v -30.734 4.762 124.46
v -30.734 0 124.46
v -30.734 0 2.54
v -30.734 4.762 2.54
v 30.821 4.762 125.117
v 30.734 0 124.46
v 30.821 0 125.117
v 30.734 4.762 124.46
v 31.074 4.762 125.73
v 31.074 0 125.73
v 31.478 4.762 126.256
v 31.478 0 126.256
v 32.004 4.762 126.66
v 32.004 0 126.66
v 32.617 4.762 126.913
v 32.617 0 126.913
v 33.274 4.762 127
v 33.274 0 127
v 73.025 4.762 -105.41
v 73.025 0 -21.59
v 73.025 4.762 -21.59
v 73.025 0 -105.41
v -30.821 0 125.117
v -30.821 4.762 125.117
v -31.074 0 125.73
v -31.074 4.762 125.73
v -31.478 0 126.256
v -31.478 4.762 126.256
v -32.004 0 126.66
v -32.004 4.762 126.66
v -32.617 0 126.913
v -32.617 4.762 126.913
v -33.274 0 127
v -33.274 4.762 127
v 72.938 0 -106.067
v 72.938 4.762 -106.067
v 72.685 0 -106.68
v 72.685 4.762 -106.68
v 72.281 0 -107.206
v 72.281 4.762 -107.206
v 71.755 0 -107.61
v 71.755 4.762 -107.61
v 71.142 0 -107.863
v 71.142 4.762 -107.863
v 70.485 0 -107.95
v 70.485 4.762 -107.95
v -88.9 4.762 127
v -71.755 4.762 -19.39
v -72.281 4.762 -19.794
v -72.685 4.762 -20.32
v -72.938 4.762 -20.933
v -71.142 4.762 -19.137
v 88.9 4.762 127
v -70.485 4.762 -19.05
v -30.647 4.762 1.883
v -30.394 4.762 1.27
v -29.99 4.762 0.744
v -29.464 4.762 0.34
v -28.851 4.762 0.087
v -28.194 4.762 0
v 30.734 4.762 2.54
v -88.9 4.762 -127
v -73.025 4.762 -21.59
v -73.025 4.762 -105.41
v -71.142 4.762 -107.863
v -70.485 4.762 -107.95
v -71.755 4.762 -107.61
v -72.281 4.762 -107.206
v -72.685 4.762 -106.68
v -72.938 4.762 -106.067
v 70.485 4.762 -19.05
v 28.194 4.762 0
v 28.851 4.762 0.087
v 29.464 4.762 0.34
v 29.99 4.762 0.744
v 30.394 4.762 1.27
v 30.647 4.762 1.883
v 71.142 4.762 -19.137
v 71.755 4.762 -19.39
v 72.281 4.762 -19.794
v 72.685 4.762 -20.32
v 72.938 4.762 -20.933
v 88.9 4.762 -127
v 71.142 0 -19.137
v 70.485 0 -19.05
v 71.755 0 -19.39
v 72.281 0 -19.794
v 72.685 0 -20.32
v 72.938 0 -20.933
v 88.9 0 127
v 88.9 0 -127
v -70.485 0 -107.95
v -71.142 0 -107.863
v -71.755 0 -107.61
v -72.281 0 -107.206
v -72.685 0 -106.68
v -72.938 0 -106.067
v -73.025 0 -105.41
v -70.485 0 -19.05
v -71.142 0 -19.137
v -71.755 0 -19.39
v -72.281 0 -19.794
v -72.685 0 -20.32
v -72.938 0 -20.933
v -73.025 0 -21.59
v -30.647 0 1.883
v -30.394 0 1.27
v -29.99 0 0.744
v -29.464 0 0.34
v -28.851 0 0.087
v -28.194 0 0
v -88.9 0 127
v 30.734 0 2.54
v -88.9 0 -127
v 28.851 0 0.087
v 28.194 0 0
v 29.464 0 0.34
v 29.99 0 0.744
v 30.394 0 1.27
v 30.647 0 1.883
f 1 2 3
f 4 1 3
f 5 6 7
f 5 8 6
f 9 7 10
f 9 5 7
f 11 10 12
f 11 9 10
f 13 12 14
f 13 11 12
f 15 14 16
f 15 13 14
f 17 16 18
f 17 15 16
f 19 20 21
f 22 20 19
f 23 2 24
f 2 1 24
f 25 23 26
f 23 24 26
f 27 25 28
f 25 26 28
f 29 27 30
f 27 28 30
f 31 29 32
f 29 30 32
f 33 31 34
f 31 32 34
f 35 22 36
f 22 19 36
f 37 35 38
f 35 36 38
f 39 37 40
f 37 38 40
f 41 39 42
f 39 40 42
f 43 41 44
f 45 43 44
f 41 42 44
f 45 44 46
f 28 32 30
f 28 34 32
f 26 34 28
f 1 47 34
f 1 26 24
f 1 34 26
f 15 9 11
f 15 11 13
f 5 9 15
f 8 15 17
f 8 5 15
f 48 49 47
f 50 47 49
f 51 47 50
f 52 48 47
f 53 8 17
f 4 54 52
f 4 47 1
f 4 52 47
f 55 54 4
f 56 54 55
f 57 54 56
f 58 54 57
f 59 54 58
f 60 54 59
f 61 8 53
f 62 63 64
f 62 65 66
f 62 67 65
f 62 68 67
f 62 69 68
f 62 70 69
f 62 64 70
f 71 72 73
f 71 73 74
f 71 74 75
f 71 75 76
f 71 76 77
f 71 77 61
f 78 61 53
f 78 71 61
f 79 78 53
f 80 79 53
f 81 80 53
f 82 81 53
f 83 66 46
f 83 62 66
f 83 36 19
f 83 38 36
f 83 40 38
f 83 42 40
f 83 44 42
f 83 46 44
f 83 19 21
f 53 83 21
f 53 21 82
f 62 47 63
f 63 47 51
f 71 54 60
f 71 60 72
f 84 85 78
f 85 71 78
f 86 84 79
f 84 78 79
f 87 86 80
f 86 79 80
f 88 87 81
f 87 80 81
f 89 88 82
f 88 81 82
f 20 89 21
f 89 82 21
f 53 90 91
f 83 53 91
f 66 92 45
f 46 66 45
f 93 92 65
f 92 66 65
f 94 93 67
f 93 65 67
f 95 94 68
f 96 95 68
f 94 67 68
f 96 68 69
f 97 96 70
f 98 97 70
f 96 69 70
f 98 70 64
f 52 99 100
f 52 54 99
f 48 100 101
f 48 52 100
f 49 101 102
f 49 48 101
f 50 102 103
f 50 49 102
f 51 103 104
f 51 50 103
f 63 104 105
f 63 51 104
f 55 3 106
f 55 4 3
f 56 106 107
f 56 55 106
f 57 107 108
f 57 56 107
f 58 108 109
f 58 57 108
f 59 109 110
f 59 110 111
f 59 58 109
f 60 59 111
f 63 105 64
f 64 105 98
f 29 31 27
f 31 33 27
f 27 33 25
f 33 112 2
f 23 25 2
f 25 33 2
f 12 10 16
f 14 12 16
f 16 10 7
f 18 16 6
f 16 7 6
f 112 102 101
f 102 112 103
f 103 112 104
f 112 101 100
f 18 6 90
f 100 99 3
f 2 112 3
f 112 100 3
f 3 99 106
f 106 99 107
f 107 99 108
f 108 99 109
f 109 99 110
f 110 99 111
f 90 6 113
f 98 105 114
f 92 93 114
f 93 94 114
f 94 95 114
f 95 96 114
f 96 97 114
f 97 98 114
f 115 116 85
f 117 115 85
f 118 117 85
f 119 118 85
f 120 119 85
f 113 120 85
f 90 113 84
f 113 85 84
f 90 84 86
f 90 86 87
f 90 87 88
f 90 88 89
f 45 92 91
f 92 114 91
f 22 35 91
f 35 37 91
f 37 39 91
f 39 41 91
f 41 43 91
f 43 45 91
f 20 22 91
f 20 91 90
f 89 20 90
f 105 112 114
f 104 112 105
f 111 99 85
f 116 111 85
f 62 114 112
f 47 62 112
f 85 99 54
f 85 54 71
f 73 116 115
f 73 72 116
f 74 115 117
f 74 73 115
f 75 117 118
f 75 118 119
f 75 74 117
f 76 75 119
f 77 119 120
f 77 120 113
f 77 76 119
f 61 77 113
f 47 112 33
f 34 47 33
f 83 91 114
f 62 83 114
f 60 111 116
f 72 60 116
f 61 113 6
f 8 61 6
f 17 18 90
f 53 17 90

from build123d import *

# Parameters (mm, degrees)
SKETCH1_W           = 146.05
SKETCH1_H           = 88.9
BOSS_EXTRUDE1_DEPTH = 4.7625
FILLET1_R           = 2.54


with BuildPart() as part:
    # Sketch1 → Boss-Extrude1 (new body)
    with BuildSketch(Plane(origin=(0, 0, 0), x_dir=(1, 0, 0), z_dir=(0, 1, 0))):
        Polygon((-30.734, -127), (-30.734, 0), (30.734, 0), (30.734, -127), (88.9, -127), (88.9, 127), (-88.9, 127), (-88.9, -127), align=None)
        with Locations((0, 63.5)):
            Rectangle(SKETCH1_W, SKETCH1_H, mode=Mode.SUBTRACT)
    extrude(amount=BOSS_EXTRUDE1_DEPTH)

    # Fillet1
    fillet1_edges = [part.edges().sort_by_distance(p)[0] for p in [
        (30.734, 2.38125, 127),
        (30.734, 2.38125, 0),
        (-30.734, 2.38125, 0),
        (-30.734, 2.38125, 127),
        (-73.025, 2.38125, -107.95),
        (-73.025, 2.38125, -19.05),
        (73.025, 2.38125, -19.05),
        (73.025, 2.38125, -107.95),
    ]]
    fillet(fillet1_edges, radius=FILLET1_R)


solid = part.part
